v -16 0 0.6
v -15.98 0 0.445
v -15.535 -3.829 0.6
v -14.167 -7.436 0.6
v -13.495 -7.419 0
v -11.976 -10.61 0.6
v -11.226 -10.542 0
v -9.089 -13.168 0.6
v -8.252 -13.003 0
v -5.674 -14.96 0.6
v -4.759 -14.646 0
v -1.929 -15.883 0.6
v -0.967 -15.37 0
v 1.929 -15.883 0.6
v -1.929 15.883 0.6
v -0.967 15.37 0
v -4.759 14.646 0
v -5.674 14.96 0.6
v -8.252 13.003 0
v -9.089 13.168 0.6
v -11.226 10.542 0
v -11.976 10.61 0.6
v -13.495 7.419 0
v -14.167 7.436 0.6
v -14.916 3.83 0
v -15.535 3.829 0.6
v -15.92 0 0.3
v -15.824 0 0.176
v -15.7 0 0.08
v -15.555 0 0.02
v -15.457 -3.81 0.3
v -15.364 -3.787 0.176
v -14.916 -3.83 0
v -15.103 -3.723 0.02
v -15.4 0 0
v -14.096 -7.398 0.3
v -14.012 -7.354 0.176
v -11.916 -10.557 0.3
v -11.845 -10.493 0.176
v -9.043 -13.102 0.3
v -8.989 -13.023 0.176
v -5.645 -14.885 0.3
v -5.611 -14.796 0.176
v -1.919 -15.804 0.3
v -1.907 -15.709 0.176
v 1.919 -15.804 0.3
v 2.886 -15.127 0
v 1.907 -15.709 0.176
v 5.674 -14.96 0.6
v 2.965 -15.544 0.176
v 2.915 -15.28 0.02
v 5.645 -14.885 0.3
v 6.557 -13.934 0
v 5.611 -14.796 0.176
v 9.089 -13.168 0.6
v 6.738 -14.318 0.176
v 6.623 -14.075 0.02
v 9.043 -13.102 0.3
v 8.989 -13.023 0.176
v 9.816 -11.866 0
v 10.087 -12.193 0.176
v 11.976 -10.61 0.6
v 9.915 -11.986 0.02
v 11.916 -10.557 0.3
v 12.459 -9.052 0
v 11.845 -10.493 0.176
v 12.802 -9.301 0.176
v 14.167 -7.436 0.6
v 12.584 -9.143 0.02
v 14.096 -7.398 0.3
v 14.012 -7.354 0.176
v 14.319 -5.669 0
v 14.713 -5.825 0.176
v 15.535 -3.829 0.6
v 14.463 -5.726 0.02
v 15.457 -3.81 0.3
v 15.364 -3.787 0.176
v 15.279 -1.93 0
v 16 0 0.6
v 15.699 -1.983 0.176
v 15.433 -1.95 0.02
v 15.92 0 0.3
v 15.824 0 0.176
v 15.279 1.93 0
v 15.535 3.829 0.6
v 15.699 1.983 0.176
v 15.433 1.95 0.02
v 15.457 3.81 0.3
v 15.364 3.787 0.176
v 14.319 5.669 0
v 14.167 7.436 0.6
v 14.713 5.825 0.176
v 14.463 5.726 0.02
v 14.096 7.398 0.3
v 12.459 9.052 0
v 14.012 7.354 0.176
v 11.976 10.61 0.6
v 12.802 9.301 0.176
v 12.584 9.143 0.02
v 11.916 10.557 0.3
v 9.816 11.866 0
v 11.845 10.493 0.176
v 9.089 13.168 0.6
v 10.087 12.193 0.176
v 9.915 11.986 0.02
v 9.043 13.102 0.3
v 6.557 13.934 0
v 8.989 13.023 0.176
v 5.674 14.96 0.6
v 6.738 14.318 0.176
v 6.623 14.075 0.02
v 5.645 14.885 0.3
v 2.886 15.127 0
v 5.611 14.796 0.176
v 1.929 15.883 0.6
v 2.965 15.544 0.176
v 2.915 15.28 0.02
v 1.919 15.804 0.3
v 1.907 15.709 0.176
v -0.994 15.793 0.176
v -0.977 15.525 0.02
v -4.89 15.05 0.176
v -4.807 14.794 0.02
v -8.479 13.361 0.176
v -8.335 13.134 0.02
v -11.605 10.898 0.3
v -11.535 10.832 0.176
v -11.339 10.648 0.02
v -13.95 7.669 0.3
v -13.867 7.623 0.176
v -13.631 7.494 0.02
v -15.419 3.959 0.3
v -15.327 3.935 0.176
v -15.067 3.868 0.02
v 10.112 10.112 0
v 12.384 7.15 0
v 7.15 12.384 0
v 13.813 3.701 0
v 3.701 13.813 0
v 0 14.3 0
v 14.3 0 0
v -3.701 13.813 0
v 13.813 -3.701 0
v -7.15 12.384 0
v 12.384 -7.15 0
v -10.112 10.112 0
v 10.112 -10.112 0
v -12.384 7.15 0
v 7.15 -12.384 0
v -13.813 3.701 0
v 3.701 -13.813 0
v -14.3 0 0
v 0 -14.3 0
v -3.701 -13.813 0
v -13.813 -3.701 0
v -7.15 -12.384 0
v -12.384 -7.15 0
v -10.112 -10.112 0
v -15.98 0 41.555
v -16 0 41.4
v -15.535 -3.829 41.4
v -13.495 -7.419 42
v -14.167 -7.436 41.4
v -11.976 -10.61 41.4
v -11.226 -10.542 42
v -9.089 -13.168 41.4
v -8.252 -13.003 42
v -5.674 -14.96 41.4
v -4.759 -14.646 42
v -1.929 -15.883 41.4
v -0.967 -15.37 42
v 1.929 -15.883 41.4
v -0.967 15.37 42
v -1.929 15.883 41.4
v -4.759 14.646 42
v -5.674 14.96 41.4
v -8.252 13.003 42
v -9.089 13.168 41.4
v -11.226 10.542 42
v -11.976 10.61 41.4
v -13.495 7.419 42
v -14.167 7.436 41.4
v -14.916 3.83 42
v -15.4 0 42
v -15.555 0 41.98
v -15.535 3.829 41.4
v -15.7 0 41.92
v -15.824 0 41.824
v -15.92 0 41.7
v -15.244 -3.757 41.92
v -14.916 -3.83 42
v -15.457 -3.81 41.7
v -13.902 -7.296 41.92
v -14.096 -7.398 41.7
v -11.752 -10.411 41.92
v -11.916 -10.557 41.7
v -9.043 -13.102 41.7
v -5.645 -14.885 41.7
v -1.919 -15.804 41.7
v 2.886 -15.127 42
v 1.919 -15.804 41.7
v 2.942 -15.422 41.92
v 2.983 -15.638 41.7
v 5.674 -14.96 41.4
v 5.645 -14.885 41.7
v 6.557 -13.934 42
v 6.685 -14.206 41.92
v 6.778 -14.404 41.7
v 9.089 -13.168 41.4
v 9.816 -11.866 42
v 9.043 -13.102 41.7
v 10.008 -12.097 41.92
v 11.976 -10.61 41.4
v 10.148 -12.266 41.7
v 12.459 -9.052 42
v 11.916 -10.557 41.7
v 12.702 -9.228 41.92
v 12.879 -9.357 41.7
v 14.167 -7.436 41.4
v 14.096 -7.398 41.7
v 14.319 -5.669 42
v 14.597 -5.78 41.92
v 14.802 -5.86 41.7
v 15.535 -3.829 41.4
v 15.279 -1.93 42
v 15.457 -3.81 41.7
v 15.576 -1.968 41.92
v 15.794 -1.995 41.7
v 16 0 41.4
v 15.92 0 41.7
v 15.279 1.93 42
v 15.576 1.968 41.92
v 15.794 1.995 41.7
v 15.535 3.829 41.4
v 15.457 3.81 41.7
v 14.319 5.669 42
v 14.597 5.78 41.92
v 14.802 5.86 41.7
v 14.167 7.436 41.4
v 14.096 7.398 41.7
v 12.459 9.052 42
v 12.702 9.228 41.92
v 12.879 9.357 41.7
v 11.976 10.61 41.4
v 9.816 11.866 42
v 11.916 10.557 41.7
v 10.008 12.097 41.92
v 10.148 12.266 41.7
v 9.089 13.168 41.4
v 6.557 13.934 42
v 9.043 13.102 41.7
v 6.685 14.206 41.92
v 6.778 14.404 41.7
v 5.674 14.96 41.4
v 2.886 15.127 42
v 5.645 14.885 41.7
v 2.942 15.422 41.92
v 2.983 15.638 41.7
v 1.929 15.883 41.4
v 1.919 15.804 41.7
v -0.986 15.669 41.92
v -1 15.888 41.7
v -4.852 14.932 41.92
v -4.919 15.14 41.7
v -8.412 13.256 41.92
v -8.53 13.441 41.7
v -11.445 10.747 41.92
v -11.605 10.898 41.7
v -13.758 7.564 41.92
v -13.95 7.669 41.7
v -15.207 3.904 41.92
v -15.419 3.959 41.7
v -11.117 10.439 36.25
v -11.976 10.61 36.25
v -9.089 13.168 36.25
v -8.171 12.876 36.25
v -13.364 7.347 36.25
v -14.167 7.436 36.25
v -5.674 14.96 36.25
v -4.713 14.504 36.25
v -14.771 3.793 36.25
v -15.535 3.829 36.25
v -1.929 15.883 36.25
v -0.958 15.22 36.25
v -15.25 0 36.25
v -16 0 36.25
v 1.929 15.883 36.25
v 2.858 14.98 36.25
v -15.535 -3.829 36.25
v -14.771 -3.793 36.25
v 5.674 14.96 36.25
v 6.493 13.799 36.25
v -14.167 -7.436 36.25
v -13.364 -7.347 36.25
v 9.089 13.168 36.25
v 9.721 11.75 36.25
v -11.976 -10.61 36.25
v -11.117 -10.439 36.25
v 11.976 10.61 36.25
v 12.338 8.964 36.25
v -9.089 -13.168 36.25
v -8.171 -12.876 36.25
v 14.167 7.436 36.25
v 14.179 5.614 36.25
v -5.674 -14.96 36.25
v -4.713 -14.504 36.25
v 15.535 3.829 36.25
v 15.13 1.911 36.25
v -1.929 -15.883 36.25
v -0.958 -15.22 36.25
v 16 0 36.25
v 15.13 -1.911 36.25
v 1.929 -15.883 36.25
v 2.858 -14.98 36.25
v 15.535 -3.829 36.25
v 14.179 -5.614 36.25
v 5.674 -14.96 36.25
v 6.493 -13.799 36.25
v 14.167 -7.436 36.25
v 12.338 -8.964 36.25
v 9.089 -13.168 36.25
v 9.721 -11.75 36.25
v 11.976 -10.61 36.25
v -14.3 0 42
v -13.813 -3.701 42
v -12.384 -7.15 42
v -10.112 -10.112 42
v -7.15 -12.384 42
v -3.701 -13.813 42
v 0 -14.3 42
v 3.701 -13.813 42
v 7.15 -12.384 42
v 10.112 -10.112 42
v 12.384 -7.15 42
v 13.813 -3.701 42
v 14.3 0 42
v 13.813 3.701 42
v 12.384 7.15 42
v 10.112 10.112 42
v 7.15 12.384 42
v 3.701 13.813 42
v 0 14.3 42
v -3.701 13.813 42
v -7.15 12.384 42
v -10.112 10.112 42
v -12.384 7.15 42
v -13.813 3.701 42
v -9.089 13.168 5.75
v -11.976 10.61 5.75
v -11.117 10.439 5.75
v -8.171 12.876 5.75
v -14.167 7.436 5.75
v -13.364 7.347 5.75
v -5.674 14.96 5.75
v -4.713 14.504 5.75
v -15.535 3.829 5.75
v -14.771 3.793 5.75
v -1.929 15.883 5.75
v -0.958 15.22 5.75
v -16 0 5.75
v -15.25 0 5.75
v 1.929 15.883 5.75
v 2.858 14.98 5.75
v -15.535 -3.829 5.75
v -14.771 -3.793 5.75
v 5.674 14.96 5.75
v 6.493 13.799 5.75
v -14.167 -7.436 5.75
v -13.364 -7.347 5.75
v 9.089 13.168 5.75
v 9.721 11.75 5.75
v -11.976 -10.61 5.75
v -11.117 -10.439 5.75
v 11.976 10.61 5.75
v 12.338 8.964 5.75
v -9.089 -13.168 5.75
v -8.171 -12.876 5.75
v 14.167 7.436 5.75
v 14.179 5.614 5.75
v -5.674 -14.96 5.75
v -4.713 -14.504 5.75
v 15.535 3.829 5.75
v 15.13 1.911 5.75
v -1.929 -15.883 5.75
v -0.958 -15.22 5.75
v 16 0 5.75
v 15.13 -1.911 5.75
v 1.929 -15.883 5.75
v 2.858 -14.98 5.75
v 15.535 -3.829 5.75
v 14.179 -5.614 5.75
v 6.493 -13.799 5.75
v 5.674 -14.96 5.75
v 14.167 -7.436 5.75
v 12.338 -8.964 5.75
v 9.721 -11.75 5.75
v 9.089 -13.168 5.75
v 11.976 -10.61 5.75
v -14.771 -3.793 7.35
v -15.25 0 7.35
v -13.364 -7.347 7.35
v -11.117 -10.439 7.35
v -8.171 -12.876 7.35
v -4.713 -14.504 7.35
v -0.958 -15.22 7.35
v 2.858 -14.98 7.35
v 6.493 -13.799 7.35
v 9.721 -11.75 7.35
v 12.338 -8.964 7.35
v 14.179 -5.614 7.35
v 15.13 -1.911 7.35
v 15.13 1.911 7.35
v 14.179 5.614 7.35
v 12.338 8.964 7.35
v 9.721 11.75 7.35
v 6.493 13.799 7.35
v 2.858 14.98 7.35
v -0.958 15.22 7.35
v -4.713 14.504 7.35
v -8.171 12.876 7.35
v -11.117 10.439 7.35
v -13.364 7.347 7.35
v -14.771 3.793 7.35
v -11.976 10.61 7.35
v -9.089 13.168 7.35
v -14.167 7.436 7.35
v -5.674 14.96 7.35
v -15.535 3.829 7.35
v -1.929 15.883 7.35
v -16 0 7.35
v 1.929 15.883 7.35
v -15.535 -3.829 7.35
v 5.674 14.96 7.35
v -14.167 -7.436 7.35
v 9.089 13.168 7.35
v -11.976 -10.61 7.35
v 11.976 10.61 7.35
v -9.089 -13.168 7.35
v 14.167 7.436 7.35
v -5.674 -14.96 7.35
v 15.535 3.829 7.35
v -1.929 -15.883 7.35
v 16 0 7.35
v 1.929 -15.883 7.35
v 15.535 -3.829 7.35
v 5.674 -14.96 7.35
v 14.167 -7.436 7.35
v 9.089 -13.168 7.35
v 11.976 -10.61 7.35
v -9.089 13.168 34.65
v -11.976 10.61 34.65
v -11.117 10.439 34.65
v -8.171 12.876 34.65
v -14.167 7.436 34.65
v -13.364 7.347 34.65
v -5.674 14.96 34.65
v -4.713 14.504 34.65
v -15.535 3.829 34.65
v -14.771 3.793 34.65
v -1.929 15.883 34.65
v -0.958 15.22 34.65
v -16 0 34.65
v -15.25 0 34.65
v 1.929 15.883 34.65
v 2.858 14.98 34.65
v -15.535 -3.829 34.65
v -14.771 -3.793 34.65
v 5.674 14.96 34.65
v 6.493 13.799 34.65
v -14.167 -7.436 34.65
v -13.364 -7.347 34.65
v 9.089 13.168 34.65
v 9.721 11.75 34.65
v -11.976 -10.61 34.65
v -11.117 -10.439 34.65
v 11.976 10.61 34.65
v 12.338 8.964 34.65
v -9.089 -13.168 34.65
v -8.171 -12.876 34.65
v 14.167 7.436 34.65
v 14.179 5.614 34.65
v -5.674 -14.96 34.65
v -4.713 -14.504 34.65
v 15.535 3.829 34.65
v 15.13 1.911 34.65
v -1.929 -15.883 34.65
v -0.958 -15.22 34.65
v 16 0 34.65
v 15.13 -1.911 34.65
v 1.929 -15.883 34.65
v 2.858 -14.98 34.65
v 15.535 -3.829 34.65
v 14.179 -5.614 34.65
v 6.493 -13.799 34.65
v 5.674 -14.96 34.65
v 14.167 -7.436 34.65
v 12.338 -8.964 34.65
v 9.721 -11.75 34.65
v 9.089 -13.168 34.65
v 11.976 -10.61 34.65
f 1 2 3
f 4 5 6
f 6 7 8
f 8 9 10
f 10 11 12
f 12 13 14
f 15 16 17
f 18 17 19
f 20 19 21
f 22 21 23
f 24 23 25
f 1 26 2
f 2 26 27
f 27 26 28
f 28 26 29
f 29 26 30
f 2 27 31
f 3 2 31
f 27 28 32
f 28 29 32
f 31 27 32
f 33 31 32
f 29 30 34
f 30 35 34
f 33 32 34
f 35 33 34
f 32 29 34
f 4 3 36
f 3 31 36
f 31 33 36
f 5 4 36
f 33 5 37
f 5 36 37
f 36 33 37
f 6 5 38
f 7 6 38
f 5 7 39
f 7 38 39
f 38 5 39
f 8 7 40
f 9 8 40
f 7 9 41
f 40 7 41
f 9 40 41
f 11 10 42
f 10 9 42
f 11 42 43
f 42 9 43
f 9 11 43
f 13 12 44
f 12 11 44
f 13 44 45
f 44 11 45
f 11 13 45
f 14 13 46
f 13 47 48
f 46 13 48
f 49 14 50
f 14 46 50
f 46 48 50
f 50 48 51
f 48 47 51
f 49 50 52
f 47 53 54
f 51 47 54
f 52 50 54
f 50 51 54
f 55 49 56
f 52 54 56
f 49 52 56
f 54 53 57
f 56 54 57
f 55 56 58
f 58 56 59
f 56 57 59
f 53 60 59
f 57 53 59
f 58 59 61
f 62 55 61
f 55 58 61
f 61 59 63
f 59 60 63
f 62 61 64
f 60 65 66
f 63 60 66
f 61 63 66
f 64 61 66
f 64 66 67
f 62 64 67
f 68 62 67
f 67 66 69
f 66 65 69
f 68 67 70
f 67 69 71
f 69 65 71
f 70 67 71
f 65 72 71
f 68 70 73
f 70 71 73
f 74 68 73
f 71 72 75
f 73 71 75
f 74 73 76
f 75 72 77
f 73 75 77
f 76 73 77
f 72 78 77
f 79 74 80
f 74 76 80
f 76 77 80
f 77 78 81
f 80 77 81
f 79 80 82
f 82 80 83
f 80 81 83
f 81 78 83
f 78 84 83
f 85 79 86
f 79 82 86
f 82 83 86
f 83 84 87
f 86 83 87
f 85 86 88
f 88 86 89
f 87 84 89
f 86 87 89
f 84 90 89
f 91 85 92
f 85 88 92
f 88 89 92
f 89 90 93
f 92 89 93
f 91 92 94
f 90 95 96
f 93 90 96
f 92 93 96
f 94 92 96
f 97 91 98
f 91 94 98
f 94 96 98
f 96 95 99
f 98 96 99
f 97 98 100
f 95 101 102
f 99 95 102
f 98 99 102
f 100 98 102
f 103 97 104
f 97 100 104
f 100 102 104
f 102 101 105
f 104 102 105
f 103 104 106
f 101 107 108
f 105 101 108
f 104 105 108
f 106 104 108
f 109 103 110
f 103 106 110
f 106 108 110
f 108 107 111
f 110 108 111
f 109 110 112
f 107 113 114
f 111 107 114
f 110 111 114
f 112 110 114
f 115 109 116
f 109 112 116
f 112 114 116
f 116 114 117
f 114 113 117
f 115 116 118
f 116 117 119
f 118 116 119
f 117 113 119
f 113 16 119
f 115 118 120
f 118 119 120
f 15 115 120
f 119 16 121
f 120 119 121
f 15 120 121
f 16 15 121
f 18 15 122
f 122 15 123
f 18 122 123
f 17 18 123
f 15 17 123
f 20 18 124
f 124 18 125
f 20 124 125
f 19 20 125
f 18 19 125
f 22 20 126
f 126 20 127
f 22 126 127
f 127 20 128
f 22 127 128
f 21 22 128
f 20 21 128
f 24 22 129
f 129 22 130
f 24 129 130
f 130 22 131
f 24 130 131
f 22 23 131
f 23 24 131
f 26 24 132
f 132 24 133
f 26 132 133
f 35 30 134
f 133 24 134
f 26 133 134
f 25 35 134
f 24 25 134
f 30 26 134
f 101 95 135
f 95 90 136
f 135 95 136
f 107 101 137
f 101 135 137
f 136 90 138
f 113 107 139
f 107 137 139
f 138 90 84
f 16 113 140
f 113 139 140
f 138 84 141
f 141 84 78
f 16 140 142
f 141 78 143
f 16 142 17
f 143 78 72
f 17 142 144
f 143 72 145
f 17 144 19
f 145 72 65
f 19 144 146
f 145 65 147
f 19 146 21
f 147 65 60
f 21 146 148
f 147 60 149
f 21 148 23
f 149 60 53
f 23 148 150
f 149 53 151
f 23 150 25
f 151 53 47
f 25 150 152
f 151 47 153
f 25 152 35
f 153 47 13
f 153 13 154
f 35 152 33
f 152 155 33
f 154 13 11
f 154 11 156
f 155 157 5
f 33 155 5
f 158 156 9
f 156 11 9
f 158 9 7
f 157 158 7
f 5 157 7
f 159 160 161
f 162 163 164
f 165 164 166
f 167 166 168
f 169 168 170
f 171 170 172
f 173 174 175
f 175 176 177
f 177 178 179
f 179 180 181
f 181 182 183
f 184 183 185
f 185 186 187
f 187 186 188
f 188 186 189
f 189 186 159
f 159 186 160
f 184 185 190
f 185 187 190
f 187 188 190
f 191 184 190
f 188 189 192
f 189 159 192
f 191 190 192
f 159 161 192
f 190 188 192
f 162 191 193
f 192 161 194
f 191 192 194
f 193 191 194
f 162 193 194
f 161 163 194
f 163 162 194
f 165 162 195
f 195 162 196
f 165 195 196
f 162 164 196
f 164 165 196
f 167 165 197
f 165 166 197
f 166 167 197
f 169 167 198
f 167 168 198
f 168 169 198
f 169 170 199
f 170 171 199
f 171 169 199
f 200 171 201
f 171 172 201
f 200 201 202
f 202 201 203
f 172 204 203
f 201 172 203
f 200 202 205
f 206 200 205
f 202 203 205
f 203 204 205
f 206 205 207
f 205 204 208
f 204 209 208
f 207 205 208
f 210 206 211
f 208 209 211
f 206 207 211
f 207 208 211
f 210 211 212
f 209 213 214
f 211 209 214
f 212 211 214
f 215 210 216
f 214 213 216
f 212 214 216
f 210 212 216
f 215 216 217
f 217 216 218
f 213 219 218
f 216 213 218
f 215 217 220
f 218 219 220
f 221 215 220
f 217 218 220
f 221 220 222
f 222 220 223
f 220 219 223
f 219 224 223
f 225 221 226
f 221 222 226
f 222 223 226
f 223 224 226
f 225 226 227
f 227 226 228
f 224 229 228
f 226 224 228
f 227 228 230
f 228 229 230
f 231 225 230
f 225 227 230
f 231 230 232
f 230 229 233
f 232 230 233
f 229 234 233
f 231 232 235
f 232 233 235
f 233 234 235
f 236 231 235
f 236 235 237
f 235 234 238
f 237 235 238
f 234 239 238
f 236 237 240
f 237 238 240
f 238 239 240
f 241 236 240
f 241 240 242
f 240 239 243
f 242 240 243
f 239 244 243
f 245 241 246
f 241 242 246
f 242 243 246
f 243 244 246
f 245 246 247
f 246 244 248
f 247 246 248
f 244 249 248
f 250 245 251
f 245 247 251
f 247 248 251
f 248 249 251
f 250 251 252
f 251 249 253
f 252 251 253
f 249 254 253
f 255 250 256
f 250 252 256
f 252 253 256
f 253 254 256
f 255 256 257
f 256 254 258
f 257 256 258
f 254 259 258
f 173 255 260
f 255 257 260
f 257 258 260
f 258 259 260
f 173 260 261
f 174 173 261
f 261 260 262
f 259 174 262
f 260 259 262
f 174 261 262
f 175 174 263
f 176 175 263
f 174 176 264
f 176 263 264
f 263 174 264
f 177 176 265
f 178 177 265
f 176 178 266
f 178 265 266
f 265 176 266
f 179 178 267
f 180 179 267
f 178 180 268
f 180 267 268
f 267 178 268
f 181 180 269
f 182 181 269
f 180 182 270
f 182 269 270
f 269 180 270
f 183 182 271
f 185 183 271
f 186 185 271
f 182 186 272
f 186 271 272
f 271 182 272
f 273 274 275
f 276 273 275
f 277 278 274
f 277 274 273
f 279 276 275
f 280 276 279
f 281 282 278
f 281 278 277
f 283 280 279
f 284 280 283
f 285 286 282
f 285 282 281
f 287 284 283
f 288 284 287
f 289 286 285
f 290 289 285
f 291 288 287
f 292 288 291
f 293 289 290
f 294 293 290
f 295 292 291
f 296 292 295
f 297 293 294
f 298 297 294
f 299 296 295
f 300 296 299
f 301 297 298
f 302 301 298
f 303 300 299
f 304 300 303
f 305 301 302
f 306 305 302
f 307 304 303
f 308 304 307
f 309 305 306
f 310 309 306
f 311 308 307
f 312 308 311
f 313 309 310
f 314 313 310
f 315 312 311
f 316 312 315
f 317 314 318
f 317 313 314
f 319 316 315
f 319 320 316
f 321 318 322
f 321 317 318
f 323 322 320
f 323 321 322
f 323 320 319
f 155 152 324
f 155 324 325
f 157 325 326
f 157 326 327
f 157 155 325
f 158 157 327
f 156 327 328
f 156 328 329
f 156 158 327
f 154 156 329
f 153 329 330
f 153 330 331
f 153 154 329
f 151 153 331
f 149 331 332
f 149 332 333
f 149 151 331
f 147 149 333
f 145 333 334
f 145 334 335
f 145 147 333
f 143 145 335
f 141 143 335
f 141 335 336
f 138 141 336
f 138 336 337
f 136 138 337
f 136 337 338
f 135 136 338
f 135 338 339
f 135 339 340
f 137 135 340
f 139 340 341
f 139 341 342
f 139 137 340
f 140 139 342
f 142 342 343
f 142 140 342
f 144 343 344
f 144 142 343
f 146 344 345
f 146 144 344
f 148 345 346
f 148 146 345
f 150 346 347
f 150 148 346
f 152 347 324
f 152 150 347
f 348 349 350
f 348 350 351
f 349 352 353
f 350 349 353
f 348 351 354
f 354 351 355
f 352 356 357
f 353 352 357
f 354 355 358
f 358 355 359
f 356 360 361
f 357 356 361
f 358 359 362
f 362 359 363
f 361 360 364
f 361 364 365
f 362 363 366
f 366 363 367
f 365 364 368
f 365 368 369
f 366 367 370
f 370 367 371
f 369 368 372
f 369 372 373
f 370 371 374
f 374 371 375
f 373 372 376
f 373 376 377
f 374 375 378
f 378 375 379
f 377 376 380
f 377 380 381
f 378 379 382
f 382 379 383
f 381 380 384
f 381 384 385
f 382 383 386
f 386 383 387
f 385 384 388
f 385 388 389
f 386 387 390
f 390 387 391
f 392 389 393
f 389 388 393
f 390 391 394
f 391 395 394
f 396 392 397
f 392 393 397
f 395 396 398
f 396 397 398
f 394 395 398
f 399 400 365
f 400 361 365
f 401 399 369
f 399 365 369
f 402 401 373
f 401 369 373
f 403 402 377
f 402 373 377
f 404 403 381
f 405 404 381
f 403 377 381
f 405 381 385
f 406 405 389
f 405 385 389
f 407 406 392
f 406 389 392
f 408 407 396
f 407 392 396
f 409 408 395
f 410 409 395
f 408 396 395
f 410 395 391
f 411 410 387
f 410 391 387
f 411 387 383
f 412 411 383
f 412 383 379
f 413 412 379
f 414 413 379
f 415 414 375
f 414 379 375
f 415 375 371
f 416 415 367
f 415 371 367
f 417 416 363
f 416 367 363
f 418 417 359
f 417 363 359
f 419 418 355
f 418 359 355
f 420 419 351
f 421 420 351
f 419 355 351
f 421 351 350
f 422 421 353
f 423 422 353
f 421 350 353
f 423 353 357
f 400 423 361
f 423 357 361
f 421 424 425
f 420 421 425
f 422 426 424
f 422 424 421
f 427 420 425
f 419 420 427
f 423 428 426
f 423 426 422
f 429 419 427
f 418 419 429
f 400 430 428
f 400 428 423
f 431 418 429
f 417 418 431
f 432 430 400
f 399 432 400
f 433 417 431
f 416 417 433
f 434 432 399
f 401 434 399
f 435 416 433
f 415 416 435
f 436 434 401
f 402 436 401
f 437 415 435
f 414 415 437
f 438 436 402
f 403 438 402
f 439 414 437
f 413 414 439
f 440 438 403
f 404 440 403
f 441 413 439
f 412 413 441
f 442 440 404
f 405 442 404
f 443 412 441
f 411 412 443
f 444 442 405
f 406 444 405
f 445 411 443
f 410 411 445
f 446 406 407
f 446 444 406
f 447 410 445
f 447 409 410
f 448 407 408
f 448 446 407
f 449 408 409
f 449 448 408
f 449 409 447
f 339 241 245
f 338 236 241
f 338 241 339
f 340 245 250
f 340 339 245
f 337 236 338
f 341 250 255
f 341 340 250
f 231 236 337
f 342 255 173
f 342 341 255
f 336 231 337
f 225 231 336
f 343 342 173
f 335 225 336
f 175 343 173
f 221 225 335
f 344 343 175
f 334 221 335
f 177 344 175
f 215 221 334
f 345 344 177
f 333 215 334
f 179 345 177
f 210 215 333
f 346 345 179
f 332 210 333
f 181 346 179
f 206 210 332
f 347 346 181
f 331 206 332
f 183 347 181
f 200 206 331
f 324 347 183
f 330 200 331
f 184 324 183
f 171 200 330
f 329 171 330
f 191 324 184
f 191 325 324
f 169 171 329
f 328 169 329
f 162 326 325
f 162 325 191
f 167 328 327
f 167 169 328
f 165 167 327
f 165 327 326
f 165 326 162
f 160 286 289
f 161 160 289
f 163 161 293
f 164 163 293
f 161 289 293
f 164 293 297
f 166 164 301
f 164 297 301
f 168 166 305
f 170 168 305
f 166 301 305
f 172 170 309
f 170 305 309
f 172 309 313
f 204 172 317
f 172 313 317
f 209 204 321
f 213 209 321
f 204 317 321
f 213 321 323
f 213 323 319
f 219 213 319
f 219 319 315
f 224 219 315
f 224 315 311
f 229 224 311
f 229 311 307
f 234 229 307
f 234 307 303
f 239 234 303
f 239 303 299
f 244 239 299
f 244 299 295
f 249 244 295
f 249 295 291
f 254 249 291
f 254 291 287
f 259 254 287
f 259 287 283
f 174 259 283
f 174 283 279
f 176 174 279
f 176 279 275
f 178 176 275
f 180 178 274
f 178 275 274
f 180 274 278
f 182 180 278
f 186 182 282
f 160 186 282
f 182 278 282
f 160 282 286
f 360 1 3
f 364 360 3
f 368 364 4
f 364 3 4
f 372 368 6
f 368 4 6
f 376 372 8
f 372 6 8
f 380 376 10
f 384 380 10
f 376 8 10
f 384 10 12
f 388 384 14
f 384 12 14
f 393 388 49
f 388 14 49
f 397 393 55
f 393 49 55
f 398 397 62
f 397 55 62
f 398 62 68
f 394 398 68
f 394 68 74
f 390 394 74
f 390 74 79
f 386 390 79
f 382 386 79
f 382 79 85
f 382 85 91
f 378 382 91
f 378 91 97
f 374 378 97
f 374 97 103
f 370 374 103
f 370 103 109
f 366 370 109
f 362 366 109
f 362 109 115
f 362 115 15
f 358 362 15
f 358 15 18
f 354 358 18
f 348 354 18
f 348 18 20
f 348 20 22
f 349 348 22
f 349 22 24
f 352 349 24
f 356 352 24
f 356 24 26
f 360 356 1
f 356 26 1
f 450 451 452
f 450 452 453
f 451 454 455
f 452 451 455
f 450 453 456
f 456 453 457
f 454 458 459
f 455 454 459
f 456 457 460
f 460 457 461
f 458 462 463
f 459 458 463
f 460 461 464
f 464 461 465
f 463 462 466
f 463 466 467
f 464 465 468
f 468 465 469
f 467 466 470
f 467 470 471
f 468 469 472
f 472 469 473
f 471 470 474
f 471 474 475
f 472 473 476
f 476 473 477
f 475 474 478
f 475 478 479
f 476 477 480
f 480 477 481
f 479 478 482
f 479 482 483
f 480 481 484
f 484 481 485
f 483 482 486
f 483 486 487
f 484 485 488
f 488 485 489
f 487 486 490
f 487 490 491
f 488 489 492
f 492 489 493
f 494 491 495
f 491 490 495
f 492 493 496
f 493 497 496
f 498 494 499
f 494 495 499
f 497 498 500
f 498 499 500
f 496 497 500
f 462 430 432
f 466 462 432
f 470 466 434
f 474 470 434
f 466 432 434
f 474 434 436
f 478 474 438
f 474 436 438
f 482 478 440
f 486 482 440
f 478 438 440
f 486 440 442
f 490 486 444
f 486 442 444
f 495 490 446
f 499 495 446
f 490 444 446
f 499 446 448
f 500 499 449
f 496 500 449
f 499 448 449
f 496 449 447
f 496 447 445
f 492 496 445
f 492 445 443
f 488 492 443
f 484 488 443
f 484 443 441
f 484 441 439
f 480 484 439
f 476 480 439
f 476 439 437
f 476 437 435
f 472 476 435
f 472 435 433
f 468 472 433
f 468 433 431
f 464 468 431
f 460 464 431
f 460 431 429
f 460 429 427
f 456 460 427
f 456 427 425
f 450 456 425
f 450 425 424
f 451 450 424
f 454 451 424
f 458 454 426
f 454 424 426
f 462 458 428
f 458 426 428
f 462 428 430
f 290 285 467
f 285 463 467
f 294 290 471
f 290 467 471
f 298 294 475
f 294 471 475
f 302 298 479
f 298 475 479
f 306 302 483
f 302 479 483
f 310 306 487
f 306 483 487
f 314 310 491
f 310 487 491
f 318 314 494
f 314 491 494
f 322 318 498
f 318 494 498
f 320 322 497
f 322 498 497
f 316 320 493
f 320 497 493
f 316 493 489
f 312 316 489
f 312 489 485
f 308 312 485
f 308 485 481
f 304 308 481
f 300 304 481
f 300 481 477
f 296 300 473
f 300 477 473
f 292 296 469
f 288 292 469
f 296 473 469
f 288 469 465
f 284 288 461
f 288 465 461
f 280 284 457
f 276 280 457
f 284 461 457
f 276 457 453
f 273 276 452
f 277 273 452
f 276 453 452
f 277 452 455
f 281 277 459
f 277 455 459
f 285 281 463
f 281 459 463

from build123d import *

# Parameters (mm, degrees)
SKETCH1_R           = 16
SKETCH1_R_2         = 14.3
BOSS_EXTRUDE1_DEPTH = 42
SKETCH3_W           = 0.75
SKETCH3_H           = 1.6
FILLET1_R           = 0.6


with BuildPart() as part:
    # Sketch1 → Boss-Extrude1 (new body)
    with BuildSketch(Plane.XY):
        with Locations(Location((0, 0, 0), (0, 0, 180))):
            Circle(SKETCH1_R)
        with Locations(Location((0, 0, 0), (0, 0, 180))):
            Circle(SKETCH1_R_2, mode=Mode.SUBTRACT)
    extrude(amount=BOSS_EXTRUDE1_DEPTH)

    # Sketch3 → Cut-Revolve2 (revolve, cut)
    with BuildSketch(Plane(origin=(0, 0, 0), x_dir=(1, 0, 0), z_dir=(0, 1, 0)), mode=Mode.PRIVATE) as cut_revolve2_sk:
        with Locations((15.625, -35.45)):
            Rectangle(SKETCH3_W, SKETCH3_H)
        with Locations((15.625, -6.55)):
            Rectangle(SKETCH3_W, SKETCH3_H)
    revolve(cut_revolve2_sk.sketch.rotate(Axis((0, 0, 0), (0, 0, 1)), 180), axis=Axis((0, 0, 0), (0, 0, 1)), mode=Mode.SUBTRACT)

    # Fillet1
    fillet1_edges = [part.edges().sort_by_distance(p)[0] for p in [
        (16, 0, 0),
        (16, 0, 42),
    ]]
    fillet(fillet1_edges, radius=FILLET1_R)


solid = part.part
